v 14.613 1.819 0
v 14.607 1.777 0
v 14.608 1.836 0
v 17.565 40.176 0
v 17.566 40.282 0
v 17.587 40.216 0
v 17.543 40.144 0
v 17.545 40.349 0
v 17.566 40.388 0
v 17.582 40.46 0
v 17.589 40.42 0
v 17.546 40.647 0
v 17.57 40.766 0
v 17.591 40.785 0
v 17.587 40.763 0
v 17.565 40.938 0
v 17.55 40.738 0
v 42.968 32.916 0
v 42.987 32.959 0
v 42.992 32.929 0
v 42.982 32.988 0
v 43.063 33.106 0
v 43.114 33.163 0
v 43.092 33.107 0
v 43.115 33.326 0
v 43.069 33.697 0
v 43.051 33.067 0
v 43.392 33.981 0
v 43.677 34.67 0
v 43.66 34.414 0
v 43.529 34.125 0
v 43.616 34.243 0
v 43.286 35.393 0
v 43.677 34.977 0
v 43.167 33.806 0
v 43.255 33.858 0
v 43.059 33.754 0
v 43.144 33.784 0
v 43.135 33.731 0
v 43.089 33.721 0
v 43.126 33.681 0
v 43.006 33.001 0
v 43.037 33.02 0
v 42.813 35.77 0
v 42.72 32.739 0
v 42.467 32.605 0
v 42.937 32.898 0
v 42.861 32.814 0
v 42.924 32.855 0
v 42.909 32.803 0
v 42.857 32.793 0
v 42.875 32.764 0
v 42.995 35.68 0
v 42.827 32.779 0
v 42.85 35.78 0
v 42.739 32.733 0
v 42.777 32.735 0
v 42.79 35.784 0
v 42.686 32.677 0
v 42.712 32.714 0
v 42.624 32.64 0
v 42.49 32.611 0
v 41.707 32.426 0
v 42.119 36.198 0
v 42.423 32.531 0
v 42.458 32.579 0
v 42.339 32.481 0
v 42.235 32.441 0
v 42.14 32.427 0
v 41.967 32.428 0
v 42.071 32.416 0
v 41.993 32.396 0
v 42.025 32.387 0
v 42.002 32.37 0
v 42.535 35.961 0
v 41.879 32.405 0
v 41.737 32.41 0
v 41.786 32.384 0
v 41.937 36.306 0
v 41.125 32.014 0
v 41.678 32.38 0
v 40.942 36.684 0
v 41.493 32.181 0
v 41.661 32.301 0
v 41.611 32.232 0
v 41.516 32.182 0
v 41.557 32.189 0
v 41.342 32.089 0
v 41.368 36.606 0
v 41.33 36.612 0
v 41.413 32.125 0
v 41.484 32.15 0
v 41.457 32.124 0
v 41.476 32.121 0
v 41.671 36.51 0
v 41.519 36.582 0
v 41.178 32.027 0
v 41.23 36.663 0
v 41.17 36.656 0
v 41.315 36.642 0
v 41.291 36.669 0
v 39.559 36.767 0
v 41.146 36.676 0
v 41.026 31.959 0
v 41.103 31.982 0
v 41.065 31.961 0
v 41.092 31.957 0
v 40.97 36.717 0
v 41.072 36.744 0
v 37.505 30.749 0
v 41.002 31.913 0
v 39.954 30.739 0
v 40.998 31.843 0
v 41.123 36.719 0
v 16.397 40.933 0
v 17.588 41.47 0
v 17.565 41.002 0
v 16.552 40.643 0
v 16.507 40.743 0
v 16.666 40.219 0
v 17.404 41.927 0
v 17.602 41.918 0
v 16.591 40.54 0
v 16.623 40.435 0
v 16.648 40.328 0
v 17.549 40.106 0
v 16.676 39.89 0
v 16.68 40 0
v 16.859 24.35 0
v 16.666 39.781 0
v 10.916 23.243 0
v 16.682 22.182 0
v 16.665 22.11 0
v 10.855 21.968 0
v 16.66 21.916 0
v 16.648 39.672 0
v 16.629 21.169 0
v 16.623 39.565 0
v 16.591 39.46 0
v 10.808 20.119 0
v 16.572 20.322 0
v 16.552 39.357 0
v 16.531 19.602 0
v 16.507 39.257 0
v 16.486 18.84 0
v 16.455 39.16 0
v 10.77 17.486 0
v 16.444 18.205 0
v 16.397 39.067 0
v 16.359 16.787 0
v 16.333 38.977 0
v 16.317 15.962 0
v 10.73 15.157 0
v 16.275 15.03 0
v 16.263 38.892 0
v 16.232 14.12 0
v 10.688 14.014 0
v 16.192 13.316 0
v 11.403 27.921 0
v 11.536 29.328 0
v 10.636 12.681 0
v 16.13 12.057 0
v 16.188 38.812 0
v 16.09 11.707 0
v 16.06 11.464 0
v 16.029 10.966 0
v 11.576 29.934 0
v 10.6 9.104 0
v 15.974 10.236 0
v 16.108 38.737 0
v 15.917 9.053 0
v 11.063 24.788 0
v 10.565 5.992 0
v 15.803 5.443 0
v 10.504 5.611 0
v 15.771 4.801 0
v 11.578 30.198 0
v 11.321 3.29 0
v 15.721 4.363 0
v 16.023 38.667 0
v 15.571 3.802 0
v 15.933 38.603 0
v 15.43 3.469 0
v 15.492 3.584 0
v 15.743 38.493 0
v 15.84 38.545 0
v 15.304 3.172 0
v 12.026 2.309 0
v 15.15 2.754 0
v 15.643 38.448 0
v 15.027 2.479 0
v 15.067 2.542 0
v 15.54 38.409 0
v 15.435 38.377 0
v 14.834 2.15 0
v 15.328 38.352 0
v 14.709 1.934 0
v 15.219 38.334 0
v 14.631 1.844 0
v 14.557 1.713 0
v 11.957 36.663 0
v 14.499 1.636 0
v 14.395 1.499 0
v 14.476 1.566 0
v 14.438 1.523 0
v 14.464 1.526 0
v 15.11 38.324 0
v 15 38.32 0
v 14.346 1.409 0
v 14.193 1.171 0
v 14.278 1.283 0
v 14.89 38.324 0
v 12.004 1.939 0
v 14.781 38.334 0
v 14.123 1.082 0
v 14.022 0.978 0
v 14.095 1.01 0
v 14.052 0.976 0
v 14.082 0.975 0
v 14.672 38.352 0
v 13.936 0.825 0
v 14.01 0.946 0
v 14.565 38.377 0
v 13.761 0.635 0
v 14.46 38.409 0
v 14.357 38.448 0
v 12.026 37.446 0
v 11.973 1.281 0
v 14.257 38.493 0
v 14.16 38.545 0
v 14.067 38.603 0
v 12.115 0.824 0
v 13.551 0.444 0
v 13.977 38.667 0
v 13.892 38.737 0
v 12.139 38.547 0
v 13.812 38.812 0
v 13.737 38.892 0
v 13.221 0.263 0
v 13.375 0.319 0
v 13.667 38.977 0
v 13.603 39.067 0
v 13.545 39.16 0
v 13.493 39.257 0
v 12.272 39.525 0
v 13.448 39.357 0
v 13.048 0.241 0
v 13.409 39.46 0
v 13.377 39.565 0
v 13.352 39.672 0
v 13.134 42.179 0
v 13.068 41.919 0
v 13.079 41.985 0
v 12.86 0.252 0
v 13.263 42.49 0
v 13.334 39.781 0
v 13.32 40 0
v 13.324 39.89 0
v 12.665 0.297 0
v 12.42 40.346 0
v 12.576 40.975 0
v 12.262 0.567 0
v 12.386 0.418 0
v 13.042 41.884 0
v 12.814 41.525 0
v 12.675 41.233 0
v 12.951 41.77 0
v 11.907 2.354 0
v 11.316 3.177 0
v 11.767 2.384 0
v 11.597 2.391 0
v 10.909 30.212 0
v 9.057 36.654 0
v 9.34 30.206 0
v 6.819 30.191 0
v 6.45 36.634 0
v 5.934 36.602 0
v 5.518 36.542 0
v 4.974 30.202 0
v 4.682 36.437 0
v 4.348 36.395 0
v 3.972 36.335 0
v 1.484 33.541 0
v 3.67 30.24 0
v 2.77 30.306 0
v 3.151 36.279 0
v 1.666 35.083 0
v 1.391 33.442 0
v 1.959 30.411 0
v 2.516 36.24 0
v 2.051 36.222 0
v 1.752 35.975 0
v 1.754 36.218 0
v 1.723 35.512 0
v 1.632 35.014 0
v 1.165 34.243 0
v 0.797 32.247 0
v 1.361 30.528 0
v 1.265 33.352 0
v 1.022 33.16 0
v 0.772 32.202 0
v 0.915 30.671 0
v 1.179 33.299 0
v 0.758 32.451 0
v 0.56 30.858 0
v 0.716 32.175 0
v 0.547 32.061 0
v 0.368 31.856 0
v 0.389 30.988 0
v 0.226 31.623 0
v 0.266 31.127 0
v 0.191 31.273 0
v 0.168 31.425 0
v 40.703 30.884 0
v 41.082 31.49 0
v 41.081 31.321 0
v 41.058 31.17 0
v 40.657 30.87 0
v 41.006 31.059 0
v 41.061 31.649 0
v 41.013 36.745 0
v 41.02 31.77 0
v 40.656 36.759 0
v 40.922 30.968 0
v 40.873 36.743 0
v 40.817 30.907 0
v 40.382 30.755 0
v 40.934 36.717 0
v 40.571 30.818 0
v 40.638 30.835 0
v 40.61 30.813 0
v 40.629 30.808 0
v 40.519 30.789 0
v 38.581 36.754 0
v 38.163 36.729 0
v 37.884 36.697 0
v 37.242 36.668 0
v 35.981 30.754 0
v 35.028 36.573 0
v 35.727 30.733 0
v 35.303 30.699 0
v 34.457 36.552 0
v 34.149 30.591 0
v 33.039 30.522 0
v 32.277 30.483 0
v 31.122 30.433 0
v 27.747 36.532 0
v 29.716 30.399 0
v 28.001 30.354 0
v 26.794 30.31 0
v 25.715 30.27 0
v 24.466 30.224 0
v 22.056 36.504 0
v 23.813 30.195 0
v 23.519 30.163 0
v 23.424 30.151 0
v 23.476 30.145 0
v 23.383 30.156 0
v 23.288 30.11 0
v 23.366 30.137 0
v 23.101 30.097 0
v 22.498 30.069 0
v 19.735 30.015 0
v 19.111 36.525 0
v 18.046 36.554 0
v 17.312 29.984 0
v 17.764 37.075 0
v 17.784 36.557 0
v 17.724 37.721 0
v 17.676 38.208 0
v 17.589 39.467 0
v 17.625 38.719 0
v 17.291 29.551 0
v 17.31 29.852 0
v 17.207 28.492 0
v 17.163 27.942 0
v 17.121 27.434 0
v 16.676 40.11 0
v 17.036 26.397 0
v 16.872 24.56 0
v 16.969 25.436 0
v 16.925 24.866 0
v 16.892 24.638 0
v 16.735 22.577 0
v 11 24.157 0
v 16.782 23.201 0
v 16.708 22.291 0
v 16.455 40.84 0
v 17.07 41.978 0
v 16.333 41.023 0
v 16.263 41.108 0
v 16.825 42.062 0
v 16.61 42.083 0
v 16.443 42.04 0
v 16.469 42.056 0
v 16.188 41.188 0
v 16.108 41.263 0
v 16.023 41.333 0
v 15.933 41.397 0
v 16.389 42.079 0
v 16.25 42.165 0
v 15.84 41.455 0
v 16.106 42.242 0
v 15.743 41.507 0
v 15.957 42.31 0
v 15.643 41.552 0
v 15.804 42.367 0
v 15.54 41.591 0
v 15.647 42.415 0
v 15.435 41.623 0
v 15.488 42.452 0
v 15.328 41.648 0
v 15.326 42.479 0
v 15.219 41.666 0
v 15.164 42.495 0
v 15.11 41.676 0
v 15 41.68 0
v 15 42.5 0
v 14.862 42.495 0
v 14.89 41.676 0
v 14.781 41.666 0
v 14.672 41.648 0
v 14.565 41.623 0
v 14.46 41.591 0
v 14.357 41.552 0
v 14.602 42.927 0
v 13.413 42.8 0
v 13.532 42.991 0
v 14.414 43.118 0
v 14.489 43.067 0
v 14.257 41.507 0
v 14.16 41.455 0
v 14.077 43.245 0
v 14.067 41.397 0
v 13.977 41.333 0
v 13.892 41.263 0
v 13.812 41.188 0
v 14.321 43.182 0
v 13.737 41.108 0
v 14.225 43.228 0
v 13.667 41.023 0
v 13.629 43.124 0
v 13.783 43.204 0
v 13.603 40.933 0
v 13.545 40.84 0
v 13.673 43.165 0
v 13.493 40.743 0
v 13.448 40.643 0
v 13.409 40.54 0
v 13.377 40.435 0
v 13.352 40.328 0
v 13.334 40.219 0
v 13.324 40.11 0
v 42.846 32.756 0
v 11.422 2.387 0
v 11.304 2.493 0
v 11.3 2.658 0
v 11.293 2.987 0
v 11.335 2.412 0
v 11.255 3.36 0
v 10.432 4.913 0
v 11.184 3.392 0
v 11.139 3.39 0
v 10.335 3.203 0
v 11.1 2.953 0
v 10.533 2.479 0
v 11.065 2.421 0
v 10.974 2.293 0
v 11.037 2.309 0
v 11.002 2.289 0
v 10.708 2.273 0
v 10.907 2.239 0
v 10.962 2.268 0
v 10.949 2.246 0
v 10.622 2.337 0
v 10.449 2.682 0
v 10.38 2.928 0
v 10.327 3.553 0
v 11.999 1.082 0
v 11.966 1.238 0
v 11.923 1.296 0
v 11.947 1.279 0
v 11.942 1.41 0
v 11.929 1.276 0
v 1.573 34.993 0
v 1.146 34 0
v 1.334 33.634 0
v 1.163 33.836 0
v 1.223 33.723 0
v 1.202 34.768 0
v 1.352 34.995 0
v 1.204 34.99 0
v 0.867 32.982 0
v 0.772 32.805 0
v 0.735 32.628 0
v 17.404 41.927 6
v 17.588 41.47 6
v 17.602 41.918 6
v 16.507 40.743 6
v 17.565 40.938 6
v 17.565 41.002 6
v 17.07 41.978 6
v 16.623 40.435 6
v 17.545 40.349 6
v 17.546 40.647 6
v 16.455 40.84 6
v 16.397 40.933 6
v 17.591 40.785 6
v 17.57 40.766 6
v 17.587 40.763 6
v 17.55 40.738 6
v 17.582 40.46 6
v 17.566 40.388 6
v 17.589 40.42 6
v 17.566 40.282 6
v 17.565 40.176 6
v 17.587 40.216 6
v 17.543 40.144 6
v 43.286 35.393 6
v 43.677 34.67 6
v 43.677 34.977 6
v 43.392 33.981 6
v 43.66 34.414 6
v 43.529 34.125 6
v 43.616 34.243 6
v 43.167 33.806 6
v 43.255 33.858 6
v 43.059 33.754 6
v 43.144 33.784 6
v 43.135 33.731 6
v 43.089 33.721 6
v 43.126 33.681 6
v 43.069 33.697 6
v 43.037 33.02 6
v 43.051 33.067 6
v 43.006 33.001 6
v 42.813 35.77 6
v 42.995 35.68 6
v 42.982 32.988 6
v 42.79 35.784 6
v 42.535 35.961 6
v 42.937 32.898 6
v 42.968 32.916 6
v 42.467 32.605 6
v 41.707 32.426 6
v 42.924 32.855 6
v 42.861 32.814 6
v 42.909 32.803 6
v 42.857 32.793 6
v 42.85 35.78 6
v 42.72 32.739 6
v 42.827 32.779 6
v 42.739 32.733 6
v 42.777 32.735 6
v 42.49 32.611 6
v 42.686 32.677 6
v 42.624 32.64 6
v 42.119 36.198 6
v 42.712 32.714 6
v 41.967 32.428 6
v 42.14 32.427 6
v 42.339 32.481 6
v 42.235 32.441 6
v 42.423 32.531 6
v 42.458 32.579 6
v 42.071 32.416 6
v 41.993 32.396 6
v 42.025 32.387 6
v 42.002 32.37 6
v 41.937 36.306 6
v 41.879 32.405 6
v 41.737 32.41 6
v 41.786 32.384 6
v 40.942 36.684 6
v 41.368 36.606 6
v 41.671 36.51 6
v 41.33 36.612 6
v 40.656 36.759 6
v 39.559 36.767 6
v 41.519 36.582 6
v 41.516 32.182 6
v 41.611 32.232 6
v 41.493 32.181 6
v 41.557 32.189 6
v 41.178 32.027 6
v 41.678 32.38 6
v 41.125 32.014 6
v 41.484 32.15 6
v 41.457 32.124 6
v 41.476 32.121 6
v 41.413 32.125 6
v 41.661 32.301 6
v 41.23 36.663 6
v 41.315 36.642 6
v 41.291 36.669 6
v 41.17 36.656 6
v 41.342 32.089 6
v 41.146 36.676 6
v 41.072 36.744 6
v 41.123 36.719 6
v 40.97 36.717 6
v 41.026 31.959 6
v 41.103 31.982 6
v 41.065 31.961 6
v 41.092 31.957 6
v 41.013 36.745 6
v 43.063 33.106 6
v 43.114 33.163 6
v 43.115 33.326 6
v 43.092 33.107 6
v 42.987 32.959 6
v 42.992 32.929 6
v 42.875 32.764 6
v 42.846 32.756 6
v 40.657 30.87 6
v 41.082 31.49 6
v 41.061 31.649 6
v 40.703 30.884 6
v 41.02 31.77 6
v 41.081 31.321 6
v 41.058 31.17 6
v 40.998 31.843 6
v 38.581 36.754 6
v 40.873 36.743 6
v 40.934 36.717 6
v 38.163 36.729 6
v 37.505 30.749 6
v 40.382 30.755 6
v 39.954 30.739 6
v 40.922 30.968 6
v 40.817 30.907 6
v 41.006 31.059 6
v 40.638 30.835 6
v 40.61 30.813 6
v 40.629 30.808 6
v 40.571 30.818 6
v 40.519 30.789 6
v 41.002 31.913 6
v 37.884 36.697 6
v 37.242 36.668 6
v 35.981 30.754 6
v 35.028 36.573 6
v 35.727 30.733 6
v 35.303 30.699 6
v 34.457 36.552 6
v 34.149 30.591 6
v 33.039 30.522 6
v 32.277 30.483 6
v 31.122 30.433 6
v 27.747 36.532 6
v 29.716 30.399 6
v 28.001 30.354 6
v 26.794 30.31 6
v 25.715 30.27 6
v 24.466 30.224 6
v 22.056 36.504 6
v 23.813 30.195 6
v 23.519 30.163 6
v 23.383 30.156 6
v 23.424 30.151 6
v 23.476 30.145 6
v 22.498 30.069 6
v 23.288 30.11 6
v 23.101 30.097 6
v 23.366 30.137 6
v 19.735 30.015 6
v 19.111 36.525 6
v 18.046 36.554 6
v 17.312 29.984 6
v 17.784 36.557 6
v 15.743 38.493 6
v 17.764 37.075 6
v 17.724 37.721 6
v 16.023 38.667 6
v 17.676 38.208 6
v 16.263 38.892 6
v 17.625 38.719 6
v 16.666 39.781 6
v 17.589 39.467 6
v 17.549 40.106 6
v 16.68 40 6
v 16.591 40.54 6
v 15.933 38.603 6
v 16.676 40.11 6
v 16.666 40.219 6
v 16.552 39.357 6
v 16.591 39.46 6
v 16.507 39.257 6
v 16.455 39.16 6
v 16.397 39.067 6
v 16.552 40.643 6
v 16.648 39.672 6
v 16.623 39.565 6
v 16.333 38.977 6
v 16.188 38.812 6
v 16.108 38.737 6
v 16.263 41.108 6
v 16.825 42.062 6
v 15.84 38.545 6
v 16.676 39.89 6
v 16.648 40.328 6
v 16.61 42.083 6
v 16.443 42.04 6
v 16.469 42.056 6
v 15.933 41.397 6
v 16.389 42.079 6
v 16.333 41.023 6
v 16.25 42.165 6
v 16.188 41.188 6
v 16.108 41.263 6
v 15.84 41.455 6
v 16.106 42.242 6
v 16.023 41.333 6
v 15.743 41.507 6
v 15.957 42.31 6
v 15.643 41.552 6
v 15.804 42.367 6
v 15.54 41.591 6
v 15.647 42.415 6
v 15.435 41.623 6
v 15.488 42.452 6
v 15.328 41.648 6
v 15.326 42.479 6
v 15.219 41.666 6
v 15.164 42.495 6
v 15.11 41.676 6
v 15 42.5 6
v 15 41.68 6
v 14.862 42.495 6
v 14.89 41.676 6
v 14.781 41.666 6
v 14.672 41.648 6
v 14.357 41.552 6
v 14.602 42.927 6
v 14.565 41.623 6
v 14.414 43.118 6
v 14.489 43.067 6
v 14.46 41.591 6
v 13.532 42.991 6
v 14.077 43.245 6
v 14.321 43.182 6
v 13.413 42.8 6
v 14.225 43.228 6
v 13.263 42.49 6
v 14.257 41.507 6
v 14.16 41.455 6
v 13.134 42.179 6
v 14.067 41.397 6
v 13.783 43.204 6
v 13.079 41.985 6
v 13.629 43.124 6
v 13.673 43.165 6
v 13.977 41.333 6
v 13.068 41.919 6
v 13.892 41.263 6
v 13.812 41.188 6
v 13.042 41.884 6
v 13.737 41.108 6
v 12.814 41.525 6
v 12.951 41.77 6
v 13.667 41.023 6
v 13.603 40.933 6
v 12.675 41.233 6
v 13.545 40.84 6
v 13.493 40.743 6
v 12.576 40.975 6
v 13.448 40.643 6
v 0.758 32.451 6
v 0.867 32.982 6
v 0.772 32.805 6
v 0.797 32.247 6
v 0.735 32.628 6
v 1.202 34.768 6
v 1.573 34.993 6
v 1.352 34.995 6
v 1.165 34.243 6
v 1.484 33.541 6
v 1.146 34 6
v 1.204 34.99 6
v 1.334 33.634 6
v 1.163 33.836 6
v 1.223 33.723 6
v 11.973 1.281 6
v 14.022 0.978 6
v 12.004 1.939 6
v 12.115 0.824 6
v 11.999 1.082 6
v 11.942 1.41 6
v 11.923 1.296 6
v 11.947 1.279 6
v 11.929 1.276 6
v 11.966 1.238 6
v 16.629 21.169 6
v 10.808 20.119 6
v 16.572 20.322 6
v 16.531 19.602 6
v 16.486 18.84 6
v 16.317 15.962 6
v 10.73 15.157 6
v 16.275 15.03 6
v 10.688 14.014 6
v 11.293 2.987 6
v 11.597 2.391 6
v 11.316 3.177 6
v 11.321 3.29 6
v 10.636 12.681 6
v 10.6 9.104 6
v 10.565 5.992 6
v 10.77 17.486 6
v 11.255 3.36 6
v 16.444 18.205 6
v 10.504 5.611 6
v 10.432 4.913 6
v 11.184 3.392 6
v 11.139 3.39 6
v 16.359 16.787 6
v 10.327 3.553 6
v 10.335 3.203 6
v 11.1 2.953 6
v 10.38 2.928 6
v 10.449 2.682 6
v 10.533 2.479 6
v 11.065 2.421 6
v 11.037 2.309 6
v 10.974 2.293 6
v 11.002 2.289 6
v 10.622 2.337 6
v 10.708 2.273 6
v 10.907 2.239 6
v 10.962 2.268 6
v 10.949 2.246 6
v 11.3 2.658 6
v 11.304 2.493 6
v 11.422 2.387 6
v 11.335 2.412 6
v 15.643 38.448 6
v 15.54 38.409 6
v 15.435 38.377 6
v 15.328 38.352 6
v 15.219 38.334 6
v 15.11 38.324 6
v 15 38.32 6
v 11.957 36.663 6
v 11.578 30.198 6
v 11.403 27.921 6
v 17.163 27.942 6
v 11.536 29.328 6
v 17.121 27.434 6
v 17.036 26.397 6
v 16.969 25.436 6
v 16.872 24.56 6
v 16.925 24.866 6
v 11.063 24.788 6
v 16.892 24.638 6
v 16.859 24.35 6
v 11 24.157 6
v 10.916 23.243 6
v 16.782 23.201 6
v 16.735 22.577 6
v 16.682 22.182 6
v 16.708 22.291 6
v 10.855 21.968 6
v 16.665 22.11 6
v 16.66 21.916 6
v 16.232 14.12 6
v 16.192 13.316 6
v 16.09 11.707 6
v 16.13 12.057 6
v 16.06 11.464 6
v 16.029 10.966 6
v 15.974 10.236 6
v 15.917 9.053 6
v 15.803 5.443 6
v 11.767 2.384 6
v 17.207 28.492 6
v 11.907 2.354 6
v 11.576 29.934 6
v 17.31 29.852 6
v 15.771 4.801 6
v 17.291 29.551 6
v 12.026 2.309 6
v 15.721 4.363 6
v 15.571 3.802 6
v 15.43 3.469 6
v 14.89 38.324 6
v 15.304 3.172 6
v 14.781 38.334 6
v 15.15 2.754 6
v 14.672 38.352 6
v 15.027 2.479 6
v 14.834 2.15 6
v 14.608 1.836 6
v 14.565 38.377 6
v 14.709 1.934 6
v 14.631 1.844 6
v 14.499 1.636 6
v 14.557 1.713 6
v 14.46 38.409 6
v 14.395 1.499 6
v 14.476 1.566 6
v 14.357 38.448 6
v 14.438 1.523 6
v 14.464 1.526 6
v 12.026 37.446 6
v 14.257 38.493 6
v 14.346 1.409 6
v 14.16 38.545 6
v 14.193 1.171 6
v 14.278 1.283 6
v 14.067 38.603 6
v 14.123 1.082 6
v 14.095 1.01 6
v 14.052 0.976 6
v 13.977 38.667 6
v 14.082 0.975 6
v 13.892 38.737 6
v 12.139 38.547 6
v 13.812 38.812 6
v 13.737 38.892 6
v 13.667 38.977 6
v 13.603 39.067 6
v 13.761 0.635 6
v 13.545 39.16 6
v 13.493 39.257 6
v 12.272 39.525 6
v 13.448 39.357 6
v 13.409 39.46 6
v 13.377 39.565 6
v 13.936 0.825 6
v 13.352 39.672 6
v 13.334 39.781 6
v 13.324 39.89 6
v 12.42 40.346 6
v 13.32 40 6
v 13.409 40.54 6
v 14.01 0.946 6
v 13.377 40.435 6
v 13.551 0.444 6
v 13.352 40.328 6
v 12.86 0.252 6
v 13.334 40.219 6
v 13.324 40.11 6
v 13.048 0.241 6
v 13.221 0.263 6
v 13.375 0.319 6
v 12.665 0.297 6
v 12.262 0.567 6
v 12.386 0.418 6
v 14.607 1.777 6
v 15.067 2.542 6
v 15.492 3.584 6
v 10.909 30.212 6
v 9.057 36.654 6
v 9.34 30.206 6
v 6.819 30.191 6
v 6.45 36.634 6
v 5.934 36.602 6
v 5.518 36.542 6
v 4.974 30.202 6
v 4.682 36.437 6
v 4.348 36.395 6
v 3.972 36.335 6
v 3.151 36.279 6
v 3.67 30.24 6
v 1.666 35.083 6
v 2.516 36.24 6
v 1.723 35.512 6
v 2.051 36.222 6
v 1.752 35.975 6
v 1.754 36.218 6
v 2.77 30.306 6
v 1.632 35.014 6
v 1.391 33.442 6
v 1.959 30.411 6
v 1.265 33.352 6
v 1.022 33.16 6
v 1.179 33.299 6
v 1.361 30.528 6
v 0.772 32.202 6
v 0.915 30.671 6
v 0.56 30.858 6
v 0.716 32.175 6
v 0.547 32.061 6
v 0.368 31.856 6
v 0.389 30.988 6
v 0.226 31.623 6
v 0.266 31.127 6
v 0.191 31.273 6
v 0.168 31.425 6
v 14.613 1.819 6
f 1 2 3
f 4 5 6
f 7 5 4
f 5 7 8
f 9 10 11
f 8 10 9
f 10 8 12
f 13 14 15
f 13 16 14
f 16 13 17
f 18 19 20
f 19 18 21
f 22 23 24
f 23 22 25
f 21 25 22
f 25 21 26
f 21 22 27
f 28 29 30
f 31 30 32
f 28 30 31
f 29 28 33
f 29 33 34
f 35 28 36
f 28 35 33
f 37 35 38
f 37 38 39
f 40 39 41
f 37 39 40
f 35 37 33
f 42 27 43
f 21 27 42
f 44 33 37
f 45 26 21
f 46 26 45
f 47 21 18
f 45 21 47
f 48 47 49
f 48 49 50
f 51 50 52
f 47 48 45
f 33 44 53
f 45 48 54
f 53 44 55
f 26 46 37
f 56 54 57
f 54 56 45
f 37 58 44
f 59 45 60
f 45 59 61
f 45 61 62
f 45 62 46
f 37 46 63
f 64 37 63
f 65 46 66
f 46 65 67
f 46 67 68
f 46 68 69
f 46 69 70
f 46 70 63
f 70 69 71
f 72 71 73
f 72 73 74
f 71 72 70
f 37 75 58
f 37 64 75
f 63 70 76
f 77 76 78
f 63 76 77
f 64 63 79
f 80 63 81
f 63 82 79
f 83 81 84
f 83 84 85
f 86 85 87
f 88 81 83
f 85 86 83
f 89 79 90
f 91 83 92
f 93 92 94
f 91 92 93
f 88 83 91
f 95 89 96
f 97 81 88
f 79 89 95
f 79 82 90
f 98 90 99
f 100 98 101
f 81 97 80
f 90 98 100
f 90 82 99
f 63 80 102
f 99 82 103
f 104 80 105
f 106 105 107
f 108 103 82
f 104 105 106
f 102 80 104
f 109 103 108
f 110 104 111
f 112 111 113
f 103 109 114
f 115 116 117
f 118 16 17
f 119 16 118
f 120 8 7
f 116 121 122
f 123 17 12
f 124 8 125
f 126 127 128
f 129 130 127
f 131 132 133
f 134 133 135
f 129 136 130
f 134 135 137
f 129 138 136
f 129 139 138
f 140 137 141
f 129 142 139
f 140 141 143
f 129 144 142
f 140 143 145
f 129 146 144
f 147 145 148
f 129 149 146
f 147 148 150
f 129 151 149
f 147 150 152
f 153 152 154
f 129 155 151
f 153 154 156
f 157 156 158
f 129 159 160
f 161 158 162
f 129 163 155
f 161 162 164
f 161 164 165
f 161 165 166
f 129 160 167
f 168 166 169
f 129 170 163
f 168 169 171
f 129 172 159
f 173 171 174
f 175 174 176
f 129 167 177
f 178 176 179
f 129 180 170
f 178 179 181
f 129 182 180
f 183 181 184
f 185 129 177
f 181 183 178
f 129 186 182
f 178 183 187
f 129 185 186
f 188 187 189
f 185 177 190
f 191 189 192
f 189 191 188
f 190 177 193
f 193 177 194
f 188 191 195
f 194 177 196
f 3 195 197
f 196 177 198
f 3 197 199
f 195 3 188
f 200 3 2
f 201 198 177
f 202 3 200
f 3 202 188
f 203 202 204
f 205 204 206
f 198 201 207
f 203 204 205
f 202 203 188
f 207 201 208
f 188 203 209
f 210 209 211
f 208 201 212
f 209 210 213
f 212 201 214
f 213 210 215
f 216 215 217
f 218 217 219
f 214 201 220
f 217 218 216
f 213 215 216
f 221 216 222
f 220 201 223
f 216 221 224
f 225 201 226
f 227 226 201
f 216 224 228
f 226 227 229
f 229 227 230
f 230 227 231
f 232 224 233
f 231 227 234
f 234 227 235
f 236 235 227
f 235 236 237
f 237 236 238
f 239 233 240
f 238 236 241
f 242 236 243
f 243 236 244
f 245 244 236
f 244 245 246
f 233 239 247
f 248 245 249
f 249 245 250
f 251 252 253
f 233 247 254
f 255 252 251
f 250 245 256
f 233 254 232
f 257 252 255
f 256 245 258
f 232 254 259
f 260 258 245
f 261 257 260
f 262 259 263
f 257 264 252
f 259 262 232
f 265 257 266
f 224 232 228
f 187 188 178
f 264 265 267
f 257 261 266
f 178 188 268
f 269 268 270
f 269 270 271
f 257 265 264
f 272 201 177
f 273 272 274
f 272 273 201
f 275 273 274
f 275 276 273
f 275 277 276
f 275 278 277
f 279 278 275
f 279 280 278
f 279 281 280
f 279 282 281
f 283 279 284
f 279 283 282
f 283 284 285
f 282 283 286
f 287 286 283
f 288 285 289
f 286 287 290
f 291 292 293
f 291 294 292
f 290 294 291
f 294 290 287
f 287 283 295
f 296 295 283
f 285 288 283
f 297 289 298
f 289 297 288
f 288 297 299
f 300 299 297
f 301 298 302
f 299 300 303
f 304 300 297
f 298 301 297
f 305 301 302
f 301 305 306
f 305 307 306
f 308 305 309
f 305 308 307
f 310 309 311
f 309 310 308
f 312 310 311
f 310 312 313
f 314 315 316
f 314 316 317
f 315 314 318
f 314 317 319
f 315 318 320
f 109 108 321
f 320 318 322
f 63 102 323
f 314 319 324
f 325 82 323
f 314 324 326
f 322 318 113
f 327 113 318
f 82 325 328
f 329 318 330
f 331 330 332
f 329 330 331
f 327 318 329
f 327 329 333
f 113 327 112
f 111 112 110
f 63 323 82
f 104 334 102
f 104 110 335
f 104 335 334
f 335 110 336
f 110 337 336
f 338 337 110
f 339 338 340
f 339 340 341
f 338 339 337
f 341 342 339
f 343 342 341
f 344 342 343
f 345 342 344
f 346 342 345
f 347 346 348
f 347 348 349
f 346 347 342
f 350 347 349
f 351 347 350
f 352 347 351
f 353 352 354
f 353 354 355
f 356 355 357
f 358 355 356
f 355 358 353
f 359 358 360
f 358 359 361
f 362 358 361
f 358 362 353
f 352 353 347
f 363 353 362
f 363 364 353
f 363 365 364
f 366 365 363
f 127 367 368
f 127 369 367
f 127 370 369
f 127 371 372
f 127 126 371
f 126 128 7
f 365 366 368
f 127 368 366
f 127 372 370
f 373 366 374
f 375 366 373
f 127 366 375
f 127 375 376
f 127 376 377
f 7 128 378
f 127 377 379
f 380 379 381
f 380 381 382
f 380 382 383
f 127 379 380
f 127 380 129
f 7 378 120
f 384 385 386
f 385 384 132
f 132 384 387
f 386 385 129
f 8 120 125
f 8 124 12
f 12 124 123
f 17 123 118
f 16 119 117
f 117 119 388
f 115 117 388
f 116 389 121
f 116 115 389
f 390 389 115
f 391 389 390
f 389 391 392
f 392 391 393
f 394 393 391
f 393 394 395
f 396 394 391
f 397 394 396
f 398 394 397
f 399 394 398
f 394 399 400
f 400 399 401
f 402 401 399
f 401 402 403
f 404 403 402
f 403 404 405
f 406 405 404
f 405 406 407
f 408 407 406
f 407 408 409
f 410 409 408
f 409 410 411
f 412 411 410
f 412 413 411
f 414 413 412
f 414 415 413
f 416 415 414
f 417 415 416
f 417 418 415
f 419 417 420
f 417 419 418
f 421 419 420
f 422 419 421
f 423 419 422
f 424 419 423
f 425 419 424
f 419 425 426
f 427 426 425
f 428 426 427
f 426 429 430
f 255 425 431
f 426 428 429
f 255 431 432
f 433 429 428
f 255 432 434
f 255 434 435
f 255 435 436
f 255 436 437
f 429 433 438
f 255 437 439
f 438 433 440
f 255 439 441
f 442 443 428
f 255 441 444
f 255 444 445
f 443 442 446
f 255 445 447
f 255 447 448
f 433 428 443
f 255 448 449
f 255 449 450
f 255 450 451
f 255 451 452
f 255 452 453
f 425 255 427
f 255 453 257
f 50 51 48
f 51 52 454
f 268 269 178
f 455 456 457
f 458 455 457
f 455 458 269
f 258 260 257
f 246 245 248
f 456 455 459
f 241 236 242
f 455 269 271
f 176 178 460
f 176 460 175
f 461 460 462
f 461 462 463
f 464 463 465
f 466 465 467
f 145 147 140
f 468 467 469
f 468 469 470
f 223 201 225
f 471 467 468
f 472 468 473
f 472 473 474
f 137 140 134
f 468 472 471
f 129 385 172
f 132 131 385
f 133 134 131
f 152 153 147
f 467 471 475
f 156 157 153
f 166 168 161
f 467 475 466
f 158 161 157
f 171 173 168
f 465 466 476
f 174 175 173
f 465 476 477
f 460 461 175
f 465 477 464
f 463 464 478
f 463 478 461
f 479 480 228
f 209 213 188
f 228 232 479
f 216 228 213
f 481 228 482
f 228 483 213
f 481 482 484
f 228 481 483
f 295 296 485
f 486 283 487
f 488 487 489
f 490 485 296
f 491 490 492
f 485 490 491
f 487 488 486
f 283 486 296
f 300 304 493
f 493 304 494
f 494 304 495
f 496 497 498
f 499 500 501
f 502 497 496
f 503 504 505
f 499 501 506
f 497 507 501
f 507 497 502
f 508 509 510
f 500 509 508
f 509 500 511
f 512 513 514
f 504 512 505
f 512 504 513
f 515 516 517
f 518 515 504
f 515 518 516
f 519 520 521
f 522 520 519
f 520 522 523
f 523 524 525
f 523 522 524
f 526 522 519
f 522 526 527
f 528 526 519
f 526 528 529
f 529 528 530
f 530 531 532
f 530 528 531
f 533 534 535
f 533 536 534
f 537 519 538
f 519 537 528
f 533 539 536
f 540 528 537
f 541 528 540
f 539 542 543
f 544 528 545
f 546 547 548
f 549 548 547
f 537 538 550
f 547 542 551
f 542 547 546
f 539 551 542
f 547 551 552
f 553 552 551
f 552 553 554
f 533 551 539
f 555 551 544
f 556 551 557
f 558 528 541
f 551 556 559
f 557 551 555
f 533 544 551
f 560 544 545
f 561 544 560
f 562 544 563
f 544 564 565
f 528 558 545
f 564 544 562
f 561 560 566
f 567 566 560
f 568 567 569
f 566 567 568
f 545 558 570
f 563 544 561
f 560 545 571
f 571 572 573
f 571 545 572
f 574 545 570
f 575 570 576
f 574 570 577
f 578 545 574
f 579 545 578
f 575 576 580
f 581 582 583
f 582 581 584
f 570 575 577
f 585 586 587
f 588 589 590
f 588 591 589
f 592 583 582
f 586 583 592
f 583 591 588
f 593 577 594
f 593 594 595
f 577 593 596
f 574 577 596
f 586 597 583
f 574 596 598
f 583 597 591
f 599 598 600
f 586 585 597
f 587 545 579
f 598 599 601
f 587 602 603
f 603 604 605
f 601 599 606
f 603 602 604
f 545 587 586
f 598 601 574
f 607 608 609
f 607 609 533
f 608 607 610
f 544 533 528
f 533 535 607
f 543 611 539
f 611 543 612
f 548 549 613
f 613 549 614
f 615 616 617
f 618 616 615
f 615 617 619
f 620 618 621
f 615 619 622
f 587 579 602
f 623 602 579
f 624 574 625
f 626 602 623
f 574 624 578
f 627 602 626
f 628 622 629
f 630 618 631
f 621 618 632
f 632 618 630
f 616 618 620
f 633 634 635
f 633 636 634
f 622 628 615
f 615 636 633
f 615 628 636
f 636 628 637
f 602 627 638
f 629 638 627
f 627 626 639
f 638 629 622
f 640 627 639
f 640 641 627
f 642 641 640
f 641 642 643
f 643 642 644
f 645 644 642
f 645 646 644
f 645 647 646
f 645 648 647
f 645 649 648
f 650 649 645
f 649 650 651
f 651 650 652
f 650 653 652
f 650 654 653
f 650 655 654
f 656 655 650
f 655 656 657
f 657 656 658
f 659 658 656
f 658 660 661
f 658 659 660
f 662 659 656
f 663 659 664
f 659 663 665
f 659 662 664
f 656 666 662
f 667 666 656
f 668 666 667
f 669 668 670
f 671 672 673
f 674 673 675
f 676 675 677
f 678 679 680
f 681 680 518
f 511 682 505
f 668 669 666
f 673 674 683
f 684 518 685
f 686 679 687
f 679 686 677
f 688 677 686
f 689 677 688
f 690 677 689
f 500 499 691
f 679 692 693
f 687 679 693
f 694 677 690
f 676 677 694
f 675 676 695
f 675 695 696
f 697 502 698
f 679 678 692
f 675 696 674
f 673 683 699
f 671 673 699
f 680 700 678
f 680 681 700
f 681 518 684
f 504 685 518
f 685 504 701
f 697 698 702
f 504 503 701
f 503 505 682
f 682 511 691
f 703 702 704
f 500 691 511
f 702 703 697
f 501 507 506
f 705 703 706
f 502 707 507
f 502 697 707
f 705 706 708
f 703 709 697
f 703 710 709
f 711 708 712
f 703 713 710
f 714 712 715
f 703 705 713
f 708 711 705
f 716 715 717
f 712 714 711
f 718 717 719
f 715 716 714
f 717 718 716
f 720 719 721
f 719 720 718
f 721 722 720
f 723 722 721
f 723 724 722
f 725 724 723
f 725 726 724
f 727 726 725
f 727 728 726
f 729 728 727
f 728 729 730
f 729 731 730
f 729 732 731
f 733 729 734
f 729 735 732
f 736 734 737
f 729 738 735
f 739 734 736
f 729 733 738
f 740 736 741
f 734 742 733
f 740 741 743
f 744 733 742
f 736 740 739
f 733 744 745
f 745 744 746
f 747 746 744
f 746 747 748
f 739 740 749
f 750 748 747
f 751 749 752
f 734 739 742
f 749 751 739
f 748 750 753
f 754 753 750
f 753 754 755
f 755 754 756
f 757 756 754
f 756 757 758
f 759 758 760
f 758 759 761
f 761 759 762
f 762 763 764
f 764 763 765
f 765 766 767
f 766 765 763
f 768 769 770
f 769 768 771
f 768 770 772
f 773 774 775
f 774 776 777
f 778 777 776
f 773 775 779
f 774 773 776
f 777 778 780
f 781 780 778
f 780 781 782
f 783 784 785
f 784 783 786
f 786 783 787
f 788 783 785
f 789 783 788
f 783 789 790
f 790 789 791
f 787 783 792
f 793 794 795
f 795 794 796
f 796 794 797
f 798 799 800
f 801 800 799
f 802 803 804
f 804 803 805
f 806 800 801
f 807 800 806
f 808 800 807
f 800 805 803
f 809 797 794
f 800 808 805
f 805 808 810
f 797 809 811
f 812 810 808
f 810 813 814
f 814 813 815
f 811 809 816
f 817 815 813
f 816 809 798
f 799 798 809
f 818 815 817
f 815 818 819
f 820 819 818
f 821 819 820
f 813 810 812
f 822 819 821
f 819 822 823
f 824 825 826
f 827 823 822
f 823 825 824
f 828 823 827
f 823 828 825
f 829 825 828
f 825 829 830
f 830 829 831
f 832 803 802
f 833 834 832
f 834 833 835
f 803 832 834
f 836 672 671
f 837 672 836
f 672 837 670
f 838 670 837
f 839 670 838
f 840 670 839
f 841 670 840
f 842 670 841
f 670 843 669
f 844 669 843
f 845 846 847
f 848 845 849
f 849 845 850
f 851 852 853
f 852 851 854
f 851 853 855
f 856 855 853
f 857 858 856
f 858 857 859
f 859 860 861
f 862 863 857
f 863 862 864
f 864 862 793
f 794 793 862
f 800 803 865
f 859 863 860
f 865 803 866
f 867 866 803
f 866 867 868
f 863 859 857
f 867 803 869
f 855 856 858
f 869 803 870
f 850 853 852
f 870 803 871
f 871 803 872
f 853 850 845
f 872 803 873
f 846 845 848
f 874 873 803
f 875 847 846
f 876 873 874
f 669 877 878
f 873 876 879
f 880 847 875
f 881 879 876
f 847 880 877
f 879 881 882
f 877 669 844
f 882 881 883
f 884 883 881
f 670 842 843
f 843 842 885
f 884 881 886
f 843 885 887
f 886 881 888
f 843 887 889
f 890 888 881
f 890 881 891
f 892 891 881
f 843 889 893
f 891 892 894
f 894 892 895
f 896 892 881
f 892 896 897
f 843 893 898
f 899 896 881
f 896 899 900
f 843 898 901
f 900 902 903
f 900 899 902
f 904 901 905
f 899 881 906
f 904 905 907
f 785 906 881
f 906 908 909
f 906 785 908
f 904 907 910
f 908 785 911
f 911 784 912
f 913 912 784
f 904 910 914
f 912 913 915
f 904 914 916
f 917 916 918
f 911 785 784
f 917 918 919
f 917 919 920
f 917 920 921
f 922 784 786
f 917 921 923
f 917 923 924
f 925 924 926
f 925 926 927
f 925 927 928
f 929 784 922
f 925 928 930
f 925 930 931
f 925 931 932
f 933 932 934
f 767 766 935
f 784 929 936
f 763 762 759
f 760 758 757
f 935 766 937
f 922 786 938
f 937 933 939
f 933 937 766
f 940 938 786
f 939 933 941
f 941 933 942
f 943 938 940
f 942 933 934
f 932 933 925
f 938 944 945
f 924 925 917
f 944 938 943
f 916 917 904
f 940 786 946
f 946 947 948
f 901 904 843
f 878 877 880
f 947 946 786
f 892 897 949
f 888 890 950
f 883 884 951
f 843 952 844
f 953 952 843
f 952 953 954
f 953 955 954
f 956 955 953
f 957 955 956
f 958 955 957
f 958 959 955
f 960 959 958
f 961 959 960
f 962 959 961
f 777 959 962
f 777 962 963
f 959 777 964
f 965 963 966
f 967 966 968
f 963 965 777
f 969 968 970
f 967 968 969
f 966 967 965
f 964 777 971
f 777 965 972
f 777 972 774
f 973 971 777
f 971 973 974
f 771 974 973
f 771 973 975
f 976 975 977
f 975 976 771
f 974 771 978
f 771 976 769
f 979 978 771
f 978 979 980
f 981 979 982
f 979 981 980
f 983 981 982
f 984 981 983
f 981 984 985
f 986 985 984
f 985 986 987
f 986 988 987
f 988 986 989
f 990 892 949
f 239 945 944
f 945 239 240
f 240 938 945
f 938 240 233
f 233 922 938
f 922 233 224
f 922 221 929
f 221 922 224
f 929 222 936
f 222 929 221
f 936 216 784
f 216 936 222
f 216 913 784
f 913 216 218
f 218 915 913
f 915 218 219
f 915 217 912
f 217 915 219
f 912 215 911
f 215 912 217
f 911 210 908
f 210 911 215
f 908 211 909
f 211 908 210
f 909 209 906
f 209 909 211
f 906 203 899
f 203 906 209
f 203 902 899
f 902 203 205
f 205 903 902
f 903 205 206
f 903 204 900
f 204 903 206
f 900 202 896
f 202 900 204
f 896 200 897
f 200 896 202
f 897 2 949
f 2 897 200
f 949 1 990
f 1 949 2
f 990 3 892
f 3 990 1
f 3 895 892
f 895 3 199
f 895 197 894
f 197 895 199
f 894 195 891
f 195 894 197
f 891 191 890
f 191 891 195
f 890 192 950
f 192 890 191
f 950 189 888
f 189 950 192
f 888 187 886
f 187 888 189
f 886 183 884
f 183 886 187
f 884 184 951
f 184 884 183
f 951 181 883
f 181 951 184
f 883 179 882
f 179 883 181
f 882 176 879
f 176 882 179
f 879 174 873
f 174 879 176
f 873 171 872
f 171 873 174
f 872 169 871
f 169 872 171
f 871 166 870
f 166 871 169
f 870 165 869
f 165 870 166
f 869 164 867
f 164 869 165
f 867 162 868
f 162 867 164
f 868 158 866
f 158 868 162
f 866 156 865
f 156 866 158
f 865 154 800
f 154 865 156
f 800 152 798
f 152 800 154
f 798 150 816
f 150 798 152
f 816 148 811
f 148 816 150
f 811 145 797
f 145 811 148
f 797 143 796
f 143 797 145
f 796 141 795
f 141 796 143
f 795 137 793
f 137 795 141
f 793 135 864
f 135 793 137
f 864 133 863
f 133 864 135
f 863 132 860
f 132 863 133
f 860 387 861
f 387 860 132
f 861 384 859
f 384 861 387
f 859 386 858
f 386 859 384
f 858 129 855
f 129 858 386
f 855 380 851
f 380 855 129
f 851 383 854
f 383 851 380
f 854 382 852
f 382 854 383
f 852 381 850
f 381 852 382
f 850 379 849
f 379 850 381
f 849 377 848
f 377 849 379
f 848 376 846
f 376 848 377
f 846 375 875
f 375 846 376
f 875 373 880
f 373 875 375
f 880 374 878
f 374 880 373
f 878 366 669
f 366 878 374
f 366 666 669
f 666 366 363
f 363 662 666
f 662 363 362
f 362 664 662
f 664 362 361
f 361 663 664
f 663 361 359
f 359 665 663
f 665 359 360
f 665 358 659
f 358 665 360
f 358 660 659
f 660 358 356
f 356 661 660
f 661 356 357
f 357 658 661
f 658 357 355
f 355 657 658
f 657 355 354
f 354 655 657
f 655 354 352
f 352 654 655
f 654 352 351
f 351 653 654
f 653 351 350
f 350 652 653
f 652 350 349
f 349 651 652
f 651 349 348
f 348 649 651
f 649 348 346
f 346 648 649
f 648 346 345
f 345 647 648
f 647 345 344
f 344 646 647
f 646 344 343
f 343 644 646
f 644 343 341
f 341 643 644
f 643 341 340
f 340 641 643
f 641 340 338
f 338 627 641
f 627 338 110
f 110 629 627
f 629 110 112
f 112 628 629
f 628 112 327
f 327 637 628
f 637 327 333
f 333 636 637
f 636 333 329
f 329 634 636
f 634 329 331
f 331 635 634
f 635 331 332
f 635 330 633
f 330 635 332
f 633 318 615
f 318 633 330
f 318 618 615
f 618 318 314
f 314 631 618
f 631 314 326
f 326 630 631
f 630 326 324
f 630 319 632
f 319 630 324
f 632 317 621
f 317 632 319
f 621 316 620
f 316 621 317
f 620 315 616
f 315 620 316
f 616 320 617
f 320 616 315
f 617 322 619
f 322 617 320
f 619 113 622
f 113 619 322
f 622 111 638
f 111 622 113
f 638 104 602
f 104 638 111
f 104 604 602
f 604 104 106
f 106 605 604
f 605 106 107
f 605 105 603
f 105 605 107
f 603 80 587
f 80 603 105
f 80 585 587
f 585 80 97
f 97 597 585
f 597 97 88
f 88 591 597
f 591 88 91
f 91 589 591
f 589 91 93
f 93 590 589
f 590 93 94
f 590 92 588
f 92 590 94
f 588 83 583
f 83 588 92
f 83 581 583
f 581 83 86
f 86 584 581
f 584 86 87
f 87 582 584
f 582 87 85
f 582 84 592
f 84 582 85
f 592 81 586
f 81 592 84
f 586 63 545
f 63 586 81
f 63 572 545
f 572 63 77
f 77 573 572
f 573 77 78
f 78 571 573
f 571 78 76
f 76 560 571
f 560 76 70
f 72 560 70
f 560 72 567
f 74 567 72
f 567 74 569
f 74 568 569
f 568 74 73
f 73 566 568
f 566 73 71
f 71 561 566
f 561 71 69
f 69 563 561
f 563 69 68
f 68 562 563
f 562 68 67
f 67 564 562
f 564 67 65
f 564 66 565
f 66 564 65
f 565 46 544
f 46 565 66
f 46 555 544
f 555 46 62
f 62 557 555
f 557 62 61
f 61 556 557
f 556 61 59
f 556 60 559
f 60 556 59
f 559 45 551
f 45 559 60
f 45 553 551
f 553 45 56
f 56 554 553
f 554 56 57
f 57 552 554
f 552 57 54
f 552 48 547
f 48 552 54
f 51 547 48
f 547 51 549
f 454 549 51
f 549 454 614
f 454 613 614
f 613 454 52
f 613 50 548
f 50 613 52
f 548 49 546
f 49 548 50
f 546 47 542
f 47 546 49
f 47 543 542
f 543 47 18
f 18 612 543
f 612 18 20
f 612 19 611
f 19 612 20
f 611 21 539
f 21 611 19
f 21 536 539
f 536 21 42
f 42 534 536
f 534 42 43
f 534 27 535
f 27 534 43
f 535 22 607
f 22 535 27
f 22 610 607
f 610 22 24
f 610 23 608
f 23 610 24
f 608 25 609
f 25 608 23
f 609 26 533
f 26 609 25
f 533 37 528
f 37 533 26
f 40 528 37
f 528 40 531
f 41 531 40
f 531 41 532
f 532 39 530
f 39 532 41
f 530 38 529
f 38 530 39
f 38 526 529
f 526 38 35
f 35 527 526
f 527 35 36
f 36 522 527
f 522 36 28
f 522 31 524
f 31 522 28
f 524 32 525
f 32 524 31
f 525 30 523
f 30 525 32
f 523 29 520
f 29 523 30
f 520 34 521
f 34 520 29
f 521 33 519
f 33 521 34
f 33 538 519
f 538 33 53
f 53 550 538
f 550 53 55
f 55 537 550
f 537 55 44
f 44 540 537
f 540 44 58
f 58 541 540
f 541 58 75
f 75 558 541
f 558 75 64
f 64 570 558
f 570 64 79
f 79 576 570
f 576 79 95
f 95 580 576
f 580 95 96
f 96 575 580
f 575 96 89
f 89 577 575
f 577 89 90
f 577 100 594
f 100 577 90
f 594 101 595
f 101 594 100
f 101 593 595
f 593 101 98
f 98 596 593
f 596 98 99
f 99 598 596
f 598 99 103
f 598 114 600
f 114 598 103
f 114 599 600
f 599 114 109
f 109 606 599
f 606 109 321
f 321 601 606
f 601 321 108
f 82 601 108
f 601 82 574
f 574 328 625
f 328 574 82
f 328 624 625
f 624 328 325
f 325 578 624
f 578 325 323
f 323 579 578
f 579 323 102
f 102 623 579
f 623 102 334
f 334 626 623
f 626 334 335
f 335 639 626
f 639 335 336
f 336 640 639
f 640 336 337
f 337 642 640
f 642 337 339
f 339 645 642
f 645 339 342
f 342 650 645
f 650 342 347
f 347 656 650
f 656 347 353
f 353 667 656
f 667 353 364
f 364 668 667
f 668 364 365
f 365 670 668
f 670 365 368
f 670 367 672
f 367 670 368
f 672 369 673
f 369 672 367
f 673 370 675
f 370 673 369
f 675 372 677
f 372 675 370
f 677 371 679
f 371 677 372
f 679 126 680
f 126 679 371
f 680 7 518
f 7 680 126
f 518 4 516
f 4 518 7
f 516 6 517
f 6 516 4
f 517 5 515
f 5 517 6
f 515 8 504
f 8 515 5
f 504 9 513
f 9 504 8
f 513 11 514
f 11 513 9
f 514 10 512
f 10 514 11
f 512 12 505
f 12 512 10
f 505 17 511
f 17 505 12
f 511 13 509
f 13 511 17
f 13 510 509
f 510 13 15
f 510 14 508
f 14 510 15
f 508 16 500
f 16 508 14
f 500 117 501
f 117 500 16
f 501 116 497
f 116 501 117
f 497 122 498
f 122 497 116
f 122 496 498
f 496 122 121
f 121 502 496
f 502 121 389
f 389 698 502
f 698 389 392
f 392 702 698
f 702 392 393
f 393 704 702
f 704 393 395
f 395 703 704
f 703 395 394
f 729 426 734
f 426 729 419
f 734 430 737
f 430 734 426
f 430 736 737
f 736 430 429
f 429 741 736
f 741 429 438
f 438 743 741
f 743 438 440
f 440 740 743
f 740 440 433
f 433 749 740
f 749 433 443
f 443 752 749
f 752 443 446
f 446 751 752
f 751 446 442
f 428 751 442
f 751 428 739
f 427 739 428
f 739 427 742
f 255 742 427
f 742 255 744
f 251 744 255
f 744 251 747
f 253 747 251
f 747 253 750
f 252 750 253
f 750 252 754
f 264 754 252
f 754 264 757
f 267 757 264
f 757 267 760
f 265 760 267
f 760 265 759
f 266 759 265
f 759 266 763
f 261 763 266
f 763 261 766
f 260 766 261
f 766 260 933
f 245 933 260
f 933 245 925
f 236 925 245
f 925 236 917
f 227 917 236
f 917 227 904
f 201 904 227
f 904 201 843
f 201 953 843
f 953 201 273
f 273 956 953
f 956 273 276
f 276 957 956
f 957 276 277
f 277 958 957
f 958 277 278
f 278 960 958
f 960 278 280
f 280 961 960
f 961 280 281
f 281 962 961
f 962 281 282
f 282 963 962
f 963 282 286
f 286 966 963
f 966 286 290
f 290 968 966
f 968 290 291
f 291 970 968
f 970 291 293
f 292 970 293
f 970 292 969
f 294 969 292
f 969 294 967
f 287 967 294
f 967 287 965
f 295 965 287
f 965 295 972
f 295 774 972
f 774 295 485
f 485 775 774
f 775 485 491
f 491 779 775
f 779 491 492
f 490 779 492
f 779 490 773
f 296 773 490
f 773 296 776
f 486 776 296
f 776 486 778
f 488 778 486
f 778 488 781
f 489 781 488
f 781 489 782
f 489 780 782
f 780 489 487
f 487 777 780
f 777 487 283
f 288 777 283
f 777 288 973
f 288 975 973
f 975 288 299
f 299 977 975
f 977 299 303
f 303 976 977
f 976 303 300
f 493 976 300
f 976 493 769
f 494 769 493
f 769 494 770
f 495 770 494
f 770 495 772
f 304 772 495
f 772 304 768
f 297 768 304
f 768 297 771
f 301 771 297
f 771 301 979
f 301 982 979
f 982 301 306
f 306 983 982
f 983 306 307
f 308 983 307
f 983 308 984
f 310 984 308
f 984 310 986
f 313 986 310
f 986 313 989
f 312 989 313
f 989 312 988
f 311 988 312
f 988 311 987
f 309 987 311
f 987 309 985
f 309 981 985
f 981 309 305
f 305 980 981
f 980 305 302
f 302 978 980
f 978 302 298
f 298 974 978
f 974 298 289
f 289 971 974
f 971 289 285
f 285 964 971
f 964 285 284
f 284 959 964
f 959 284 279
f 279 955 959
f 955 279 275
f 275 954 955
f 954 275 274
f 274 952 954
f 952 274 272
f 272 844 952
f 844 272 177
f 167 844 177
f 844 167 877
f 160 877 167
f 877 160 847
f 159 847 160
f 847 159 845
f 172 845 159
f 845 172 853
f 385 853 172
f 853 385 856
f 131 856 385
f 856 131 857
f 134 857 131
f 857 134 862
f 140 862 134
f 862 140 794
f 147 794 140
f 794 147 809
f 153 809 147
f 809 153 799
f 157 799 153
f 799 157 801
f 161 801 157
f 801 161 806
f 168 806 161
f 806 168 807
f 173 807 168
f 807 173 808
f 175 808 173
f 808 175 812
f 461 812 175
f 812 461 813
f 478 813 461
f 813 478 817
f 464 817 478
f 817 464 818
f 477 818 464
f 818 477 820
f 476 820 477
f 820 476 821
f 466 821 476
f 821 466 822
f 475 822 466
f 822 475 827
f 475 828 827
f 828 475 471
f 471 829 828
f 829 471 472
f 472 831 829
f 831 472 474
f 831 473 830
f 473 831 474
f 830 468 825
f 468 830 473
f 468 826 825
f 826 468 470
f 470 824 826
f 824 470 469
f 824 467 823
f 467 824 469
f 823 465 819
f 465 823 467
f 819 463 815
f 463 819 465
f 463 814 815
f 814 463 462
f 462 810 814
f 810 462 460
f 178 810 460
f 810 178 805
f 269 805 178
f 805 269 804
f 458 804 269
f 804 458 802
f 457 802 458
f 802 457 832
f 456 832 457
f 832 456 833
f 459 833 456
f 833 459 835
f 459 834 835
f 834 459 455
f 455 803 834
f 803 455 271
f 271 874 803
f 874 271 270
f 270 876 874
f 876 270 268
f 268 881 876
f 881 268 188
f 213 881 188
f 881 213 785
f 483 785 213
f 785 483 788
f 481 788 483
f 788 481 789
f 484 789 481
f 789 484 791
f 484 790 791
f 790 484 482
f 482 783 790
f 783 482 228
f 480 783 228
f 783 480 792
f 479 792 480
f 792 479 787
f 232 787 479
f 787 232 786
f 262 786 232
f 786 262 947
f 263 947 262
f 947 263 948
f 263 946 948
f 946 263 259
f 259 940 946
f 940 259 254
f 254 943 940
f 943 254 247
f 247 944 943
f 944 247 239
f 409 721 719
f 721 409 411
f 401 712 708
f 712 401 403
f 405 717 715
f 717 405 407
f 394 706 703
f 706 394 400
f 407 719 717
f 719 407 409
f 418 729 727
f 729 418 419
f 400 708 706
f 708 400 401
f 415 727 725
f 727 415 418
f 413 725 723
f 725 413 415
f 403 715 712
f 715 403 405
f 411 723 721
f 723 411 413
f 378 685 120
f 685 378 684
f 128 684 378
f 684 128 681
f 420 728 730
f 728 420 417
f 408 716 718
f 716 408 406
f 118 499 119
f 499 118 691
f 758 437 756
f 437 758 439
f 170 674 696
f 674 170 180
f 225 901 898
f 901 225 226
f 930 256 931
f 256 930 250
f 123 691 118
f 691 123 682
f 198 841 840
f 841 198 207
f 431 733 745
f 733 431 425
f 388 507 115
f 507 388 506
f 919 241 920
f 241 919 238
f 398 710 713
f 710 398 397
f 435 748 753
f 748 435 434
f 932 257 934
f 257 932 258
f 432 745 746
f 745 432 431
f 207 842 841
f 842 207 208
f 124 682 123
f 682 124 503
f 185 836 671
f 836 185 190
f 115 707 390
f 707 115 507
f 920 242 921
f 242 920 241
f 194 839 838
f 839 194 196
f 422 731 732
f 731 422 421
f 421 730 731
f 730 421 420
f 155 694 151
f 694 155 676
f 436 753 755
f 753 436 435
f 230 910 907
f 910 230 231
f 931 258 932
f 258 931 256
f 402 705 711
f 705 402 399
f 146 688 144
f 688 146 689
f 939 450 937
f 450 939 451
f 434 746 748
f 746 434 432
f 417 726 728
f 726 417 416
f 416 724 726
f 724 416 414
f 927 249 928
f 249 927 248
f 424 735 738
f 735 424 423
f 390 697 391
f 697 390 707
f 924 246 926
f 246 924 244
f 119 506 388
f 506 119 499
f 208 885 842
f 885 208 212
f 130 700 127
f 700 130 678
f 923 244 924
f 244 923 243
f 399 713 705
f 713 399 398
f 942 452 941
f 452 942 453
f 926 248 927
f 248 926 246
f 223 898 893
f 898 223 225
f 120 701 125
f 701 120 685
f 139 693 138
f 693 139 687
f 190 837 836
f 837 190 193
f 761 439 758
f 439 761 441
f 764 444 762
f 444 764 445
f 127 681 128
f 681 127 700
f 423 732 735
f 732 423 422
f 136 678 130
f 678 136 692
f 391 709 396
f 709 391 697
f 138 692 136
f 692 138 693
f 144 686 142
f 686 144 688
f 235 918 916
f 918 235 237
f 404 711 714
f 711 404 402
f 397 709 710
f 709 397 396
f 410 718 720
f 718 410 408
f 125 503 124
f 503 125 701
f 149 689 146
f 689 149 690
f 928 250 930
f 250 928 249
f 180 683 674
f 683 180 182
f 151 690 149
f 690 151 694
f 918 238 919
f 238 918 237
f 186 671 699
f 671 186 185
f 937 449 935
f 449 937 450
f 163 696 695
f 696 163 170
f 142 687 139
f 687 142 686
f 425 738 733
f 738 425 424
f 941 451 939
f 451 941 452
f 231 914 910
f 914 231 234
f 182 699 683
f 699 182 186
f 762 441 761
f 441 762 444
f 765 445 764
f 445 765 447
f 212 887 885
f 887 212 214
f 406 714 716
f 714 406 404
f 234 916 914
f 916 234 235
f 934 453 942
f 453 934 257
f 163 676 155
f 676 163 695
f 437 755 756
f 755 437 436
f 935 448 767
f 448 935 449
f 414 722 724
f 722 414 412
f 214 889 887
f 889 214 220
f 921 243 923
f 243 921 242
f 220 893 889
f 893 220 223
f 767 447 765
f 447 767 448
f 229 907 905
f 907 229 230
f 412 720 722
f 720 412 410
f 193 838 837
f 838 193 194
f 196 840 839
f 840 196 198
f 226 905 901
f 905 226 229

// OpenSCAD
difference(){
	union(){
		translate([0.19,0,0]) color("red") linear_extrude(height = 6) scale(0.15,0.15,1) import("paradize1.dxf");
		translate([15,40,0]) color("yellow") cylinder(r=2.5, h=6, $fn=96);
	}
	translate([15,40,-2]) color("orange") cylinder(r=1.68, h=10, $fn=96);
}
